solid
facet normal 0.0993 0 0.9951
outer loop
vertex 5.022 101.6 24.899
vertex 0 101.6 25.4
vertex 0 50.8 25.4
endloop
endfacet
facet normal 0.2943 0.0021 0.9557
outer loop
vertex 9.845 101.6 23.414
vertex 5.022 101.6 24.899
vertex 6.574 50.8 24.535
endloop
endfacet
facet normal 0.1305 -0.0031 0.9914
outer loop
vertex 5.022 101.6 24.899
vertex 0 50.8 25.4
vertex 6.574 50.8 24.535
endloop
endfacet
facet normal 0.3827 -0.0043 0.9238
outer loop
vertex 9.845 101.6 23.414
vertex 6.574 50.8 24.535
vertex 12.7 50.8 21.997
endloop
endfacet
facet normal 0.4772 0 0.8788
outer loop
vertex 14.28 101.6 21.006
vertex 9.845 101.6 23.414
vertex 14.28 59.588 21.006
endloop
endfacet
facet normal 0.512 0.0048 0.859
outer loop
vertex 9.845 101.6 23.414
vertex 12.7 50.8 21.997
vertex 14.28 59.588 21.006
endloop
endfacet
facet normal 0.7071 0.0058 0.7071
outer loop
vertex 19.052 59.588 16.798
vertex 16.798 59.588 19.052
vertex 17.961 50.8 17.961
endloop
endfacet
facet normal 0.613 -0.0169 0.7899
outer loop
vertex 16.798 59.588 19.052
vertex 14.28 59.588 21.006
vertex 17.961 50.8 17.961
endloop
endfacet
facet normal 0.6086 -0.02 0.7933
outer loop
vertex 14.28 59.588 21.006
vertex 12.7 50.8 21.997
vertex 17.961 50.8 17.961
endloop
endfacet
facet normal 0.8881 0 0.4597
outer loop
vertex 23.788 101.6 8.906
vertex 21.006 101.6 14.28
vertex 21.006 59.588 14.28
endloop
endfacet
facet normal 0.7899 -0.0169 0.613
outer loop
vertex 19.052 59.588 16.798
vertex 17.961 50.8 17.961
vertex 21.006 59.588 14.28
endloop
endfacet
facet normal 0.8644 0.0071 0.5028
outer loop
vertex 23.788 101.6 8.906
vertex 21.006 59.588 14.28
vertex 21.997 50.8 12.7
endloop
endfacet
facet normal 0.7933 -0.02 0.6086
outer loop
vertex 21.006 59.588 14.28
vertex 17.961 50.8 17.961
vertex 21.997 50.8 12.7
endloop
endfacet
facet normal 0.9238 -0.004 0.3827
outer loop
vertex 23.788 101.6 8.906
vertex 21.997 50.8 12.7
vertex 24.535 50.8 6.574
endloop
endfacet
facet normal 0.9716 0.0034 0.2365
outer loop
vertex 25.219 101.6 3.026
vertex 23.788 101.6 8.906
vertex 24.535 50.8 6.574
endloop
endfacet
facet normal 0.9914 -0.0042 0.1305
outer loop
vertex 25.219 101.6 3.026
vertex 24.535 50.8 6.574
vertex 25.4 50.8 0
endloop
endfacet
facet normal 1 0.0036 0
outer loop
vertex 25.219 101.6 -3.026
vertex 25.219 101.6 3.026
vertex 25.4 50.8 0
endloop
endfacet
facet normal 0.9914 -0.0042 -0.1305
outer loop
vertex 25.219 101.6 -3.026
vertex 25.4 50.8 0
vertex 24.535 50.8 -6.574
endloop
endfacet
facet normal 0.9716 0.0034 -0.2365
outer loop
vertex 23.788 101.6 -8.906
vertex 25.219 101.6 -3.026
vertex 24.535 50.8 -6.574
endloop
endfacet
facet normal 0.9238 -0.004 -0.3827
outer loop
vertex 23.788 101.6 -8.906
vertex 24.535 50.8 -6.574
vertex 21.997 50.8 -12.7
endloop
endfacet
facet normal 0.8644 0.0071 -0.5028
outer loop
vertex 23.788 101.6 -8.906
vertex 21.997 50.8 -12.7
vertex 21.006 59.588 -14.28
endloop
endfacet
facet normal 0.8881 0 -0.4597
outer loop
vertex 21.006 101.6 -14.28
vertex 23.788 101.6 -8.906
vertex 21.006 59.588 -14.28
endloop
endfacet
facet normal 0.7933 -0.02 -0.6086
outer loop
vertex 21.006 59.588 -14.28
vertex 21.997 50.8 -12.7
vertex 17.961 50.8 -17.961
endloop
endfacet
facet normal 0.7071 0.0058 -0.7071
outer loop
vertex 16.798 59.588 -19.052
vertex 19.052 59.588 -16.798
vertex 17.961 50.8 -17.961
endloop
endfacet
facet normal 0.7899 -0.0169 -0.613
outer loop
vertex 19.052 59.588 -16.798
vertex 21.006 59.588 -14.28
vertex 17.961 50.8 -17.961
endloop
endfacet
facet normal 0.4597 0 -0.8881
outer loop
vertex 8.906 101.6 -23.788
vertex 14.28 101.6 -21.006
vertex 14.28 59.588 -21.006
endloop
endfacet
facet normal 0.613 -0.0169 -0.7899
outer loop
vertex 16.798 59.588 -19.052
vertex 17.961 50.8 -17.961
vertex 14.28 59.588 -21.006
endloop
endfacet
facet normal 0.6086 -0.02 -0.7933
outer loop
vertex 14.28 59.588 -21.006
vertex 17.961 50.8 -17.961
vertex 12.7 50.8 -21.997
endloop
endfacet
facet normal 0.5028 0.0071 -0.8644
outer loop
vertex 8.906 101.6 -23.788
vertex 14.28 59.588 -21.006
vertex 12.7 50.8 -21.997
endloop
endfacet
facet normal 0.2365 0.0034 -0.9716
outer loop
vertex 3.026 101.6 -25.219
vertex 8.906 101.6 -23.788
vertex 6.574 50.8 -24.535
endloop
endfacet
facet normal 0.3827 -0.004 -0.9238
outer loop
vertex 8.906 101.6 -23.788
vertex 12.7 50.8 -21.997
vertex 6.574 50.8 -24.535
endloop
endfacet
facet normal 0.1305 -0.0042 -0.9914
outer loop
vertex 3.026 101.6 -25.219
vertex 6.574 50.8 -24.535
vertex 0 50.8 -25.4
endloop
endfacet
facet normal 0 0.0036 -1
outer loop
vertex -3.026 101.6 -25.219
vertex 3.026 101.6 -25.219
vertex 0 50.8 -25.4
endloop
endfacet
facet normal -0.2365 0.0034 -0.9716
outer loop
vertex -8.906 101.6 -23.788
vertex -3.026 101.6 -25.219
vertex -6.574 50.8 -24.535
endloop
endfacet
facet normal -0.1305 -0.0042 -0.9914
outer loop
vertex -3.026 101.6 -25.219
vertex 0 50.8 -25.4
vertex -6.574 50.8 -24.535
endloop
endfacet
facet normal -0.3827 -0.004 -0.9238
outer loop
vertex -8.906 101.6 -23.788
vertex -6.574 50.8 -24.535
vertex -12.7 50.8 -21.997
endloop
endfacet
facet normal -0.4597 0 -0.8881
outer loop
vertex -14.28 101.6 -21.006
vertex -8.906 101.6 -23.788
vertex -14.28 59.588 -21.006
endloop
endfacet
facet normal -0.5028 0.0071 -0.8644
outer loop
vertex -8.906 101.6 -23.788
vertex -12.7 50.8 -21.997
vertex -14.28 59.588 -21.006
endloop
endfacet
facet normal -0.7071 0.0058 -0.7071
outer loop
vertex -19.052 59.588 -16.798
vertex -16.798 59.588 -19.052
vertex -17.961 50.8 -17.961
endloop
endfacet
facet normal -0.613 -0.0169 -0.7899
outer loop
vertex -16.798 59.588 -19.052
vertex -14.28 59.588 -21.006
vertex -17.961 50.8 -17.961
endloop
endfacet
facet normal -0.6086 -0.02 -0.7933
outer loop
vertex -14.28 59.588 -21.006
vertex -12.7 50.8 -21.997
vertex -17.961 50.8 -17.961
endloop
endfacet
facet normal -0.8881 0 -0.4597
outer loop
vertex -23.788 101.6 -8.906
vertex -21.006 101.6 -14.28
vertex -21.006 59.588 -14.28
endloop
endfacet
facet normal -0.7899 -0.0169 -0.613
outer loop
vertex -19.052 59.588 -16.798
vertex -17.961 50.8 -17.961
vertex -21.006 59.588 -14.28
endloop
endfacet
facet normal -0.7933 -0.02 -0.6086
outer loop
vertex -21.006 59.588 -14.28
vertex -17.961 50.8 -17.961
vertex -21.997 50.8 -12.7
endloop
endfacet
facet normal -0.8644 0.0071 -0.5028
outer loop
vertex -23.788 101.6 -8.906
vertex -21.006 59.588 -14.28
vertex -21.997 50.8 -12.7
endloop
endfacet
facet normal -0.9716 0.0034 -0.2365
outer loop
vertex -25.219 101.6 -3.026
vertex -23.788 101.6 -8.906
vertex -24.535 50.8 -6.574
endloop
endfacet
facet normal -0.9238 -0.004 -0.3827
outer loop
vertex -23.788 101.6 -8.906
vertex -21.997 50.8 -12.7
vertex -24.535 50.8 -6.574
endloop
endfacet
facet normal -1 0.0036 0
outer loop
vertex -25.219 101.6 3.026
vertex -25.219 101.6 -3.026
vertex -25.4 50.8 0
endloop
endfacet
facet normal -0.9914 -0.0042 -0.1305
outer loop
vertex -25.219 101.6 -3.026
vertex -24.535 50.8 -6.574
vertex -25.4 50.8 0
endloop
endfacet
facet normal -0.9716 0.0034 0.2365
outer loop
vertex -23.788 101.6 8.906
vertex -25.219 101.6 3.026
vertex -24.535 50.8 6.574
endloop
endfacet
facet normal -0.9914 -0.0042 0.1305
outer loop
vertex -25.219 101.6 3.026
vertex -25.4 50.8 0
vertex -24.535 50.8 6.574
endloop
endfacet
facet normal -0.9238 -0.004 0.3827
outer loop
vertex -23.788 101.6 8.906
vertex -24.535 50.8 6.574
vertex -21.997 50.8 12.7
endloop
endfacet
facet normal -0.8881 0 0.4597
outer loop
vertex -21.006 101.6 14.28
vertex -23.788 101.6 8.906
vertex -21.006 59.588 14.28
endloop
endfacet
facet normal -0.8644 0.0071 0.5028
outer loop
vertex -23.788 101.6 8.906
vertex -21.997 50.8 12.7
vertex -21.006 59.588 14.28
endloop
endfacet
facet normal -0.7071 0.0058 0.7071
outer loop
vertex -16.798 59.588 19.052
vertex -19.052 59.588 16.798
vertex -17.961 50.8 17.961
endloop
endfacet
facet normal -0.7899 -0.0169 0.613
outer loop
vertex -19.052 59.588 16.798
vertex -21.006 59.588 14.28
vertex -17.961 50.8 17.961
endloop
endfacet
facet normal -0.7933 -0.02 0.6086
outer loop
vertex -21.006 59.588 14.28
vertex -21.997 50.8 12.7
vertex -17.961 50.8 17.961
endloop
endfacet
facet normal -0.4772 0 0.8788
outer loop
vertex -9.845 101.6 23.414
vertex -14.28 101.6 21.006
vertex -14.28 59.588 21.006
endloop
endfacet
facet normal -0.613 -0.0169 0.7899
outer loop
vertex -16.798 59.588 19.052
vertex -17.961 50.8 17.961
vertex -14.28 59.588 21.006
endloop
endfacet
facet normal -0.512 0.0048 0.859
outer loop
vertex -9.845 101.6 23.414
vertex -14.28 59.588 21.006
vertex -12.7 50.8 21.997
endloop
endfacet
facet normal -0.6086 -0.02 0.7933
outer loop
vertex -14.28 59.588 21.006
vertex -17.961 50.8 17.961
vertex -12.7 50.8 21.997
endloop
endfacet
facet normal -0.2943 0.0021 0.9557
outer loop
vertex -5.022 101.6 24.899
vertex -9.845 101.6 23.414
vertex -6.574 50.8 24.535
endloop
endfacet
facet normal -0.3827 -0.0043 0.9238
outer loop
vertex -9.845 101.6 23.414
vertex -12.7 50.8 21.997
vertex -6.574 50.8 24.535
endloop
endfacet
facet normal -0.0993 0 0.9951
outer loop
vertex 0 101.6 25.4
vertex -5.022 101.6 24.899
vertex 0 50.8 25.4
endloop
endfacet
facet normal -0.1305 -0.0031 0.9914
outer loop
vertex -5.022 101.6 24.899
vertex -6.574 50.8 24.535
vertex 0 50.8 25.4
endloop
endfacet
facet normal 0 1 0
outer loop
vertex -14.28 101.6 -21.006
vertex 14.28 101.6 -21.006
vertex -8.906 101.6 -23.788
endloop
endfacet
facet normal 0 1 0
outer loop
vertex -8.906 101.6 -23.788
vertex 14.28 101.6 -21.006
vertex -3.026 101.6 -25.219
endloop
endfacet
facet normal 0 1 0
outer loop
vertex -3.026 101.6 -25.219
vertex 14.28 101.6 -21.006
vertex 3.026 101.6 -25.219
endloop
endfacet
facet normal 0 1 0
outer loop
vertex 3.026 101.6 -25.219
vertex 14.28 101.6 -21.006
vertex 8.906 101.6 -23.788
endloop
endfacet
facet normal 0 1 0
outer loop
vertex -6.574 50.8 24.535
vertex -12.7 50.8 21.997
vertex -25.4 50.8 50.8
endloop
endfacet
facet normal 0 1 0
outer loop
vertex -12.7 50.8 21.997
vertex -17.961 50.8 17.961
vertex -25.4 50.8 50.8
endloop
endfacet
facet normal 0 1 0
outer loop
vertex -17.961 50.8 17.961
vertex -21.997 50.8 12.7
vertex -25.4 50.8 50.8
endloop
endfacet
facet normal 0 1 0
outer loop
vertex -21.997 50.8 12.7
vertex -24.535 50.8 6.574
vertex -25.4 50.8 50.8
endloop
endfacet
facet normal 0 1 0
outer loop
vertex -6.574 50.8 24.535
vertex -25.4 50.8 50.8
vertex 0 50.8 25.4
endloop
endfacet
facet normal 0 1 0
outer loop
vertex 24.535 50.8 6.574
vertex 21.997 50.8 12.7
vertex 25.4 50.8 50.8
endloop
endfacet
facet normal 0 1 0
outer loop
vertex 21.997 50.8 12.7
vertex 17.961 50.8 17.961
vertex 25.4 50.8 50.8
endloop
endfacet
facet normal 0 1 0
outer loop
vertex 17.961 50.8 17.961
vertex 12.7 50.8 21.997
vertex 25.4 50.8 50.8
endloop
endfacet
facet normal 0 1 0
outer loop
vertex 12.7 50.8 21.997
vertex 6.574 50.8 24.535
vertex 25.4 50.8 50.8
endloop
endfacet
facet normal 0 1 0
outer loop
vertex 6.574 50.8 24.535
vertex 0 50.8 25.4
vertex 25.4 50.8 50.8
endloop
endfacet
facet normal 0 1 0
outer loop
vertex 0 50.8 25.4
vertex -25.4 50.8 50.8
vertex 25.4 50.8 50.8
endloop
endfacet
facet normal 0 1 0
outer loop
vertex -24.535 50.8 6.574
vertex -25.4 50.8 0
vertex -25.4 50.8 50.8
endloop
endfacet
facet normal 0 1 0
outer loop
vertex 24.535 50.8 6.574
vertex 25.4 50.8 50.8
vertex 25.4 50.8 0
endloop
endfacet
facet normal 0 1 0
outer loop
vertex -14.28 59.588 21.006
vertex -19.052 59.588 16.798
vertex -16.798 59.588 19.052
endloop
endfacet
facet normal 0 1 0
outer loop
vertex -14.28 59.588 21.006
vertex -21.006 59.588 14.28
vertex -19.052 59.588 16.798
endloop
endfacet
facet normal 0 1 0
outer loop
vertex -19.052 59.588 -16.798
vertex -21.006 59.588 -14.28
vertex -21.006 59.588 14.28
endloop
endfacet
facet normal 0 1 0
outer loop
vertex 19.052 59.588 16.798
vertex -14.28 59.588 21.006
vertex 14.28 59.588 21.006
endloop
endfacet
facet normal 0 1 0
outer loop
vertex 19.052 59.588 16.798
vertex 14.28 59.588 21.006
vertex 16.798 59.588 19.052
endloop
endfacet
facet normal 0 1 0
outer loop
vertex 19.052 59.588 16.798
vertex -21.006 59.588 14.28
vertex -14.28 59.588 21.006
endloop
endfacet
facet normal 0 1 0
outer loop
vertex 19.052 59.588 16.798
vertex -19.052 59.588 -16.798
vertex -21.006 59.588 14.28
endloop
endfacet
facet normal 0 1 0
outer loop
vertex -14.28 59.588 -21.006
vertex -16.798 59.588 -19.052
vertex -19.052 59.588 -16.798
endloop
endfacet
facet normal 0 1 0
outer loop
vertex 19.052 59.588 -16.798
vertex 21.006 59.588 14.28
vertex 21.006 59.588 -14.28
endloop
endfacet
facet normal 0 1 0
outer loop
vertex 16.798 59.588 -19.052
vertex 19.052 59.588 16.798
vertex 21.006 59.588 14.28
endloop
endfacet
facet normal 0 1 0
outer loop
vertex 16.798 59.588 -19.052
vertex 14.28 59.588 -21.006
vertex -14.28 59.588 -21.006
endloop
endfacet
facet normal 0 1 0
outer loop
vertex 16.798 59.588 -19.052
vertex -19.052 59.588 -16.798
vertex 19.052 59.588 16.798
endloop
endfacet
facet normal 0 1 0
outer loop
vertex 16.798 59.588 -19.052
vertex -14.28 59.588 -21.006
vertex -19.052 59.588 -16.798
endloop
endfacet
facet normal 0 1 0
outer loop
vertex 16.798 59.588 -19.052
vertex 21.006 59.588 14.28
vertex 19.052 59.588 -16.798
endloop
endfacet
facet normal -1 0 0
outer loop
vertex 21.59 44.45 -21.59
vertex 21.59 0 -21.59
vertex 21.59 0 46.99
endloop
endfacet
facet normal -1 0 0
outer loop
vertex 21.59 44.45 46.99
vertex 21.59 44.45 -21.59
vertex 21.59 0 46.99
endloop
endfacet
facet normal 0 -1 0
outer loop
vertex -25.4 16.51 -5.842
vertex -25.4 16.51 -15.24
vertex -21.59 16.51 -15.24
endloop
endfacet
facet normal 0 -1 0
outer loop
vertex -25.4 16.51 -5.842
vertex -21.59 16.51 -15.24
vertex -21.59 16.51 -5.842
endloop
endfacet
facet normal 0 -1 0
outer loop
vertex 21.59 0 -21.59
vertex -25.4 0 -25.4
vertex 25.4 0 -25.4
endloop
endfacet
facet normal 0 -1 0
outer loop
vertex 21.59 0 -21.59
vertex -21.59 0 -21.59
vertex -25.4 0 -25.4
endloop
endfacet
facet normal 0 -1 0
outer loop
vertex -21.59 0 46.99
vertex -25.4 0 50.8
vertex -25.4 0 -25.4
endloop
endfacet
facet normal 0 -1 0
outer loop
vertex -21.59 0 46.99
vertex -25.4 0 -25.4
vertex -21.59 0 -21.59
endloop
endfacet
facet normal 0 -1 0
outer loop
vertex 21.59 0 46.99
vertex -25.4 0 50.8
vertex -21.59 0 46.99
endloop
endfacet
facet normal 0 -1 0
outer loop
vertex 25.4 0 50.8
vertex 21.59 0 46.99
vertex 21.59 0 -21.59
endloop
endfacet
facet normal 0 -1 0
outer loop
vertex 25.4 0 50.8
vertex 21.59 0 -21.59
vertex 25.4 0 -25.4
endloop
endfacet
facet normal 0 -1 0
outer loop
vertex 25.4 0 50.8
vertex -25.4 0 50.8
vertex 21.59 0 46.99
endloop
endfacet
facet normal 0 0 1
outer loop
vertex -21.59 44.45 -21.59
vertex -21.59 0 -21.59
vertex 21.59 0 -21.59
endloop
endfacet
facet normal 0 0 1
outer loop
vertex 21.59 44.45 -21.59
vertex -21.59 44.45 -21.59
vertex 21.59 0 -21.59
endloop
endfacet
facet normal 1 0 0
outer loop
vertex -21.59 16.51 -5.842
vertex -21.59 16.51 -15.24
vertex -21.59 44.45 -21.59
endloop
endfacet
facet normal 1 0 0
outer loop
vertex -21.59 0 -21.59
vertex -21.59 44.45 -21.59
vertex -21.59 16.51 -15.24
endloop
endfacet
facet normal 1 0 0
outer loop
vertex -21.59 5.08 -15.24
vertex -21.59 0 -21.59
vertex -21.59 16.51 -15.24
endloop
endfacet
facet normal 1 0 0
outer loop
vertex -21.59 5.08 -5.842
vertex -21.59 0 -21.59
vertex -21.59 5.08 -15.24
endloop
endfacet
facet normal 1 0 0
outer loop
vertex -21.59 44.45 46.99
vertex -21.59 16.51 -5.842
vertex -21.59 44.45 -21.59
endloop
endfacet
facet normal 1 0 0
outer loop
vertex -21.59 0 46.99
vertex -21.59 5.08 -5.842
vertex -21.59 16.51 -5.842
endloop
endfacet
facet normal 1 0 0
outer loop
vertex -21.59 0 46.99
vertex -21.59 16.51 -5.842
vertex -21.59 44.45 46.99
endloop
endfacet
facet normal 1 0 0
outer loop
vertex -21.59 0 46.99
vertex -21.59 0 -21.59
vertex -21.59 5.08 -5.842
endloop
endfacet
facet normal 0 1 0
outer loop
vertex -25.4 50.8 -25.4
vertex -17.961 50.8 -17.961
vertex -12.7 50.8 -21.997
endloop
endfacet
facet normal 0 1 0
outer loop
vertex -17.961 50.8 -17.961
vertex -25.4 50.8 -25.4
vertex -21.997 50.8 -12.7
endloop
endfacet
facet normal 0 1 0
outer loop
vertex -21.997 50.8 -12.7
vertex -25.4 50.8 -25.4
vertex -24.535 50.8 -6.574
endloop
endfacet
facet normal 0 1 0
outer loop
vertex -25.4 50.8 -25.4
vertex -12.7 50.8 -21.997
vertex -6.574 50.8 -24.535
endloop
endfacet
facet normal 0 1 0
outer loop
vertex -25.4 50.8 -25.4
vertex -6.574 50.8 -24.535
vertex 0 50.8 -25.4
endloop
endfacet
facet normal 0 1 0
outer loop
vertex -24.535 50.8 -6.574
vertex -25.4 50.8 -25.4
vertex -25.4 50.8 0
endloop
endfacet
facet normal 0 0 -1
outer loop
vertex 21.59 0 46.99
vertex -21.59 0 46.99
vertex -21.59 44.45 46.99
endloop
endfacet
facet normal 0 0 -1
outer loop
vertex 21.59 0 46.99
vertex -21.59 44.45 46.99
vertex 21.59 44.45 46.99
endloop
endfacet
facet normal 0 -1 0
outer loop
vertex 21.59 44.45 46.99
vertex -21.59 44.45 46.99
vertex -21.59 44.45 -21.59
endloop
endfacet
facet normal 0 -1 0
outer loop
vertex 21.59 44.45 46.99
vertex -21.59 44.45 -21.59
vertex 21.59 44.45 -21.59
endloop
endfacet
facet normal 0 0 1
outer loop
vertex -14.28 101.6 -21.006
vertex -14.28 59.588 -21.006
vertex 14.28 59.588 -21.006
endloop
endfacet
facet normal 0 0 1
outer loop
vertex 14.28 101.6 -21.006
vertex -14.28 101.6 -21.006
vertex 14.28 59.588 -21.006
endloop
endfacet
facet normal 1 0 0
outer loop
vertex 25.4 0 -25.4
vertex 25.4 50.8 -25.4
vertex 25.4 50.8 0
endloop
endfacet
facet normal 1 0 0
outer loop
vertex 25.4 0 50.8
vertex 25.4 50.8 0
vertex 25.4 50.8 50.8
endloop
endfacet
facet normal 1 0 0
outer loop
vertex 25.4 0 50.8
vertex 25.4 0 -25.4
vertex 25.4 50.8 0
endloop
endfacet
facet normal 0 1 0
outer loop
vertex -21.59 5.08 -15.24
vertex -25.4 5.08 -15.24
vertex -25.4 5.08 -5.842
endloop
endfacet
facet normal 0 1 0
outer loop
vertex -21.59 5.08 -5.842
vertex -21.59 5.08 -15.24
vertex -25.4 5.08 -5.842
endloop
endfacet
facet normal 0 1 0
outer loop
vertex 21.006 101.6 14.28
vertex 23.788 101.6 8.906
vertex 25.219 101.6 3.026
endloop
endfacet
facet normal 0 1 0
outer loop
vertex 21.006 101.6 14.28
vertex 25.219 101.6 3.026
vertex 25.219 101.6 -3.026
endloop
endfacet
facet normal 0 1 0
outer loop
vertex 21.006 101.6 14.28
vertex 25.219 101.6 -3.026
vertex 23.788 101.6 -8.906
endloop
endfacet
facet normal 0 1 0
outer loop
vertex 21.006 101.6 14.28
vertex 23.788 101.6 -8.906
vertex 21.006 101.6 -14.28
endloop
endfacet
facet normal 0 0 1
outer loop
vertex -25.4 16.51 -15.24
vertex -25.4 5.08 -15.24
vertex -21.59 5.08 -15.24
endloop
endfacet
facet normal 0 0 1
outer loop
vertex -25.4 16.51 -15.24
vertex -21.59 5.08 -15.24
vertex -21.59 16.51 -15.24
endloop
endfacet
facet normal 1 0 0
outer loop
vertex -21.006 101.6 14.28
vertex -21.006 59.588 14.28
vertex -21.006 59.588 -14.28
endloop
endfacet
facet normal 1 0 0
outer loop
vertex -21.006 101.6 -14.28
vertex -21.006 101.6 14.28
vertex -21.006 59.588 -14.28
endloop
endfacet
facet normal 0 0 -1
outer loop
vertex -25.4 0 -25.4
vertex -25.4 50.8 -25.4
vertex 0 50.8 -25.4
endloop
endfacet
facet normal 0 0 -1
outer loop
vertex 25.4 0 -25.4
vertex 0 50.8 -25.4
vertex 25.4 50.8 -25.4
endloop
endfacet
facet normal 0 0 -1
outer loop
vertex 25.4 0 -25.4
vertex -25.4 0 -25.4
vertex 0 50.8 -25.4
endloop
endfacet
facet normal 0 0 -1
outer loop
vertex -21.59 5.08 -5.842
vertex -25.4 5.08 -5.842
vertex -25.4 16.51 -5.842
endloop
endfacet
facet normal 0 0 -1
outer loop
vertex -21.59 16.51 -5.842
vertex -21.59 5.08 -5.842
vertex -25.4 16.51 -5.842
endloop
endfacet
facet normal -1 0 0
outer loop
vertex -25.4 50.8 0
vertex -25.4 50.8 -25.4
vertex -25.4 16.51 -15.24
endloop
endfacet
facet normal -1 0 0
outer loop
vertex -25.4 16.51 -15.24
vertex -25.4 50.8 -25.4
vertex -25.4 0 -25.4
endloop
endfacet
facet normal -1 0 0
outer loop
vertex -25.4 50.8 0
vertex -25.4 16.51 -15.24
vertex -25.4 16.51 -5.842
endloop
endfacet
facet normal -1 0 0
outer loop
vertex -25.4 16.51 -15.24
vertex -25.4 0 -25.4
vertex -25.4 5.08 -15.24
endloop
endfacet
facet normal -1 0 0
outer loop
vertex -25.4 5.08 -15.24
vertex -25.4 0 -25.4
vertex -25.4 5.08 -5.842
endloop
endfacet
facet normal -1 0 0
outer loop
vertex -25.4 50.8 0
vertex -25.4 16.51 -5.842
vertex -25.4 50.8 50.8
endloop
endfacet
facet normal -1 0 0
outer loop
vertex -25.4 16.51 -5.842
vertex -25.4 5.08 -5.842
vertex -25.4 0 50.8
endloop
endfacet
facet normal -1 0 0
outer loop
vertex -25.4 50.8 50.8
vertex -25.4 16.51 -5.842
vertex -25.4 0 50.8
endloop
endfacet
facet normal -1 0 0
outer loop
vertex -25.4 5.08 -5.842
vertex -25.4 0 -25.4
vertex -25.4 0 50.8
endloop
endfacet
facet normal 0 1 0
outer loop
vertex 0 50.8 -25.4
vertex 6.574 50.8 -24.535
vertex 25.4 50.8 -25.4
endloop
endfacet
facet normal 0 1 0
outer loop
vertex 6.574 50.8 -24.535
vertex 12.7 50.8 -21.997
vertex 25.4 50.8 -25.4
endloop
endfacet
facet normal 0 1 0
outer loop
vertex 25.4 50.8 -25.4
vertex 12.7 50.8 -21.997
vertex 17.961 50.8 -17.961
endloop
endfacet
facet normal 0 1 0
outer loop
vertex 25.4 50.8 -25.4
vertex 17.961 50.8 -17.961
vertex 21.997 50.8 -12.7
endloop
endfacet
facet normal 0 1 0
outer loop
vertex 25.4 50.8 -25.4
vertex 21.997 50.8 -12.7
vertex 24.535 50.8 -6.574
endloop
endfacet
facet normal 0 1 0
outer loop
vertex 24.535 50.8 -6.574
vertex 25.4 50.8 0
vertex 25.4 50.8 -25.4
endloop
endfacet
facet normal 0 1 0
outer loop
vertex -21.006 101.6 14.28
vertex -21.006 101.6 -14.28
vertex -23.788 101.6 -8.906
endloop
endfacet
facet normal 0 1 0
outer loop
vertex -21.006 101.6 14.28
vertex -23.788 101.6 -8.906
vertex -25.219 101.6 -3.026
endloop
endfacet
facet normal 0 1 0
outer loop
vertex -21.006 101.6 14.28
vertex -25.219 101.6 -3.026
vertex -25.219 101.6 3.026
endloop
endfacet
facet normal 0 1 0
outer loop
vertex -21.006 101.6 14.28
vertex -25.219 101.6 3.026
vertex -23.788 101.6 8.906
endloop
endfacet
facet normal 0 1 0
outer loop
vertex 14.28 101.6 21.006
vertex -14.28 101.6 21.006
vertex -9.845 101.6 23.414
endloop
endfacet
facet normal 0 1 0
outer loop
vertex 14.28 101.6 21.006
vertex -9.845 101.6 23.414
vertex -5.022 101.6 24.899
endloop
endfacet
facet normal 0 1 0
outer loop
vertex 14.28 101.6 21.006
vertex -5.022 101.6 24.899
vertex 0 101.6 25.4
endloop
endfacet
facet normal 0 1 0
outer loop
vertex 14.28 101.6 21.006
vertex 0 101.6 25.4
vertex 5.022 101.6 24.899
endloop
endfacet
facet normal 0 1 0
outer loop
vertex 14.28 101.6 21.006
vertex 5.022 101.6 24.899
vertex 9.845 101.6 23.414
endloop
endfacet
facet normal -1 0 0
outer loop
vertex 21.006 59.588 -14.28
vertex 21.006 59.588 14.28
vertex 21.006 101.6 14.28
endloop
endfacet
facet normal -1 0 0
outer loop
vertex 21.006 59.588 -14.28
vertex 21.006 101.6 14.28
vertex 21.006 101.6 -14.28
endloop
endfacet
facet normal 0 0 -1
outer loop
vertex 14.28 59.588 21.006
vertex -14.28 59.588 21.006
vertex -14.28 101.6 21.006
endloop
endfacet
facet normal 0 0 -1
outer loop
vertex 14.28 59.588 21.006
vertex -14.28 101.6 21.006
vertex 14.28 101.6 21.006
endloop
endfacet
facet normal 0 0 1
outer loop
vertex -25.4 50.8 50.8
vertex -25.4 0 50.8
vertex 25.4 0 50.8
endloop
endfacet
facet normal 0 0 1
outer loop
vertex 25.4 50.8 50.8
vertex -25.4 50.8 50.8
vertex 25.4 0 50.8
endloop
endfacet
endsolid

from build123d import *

# Parameters (mm, degrees)
SKETCH1_R           = 25.4
BOSS_EXTRUDE1_DEPTH = 101.6
SKETCH2_W           = 42.0116
SKETCH2_H           = 42.0116
CUT_EXTRUDE1_DEPTH  = 42.0116
SKETCH3_W           = 50.8
SKETCH3_H           = 76.2
BOSS_EXTRUDE2_DEPTH = 50.8
SKETCH4_W           = 43.18
SKETCH4_H           = 68.58
CUT_EXTRUDE2_DEPTH  = 44.45
CUT_EXTRUDE3_REACH  = 126.434
SKETCH5_W           = 9.398
SKETCH5_H           = 11.43


with BuildPart() as part:
    # Sketch1 → Boss-Extrude1 (new body)
    with BuildSketch(Plane(origin=(0, 0, 0), x_dir=(1, 0, 0), z_dir=(0, 1, 0))):
        with Locations(Location((0, 0, 0), (0, 0, 270))):
            Circle(SKETCH1_R)
    extrude(amount=BOSS_EXTRUDE1_DEPTH)

    # Sketch2 → Cut-Extrude1 (cut)
    with BuildSketch(Plane(origin=(0, 101.6, 0), x_dir=(1, 0, 0), z_dir=(0, 1, 0))):
        Rectangle(SKETCH2_W, SKETCH2_H)
    extrude(amount=-CUT_EXTRUDE1_DEPTH, mode=Mode.SUBTRACT)

    # Sketch3 → Boss-Extrude2 (add)
    with BuildSketch(Plane.XZ):
        with Locations((0, 12.7)):
            Rectangle(SKETCH3_W, SKETCH3_H)
    extrude(amount=-BOSS_EXTRUDE2_DEPTH)

    # Sketch4 → Cut-Extrude2 (cut)
    with BuildSketch(Plane.XZ):
        with Locations((0, 12.7)):
            Rectangle(SKETCH4_W, SKETCH4_H)
    extrude(amount=-CUT_EXTRUDE2_DEPTH, mode=Mode.SUBTRACT)

    # Sketch5 → Cut-Extrude3 (cut, up to next)
    with BuildSketch(Plane.ZY.offset(25.4), mode=Mode.PRIVATE) as cut_extrude3_sk1:
        with Locations((-10.541, 10.795)):
            Rectangle(SKETCH5_W, SKETCH5_H)
    cut_extrude3_tool1 = extrude(cut_extrude3_sk1.sketch, amount=-CUT_EXTRUDE3_REACH, mode=Mode.PRIVATE) & part.part
    add(cut_extrude3_tool1.solids().sort_by_distance((-25.4, 10.795, -10.541))[0], mode=Mode.SUBTRACT)


solid = part.part
